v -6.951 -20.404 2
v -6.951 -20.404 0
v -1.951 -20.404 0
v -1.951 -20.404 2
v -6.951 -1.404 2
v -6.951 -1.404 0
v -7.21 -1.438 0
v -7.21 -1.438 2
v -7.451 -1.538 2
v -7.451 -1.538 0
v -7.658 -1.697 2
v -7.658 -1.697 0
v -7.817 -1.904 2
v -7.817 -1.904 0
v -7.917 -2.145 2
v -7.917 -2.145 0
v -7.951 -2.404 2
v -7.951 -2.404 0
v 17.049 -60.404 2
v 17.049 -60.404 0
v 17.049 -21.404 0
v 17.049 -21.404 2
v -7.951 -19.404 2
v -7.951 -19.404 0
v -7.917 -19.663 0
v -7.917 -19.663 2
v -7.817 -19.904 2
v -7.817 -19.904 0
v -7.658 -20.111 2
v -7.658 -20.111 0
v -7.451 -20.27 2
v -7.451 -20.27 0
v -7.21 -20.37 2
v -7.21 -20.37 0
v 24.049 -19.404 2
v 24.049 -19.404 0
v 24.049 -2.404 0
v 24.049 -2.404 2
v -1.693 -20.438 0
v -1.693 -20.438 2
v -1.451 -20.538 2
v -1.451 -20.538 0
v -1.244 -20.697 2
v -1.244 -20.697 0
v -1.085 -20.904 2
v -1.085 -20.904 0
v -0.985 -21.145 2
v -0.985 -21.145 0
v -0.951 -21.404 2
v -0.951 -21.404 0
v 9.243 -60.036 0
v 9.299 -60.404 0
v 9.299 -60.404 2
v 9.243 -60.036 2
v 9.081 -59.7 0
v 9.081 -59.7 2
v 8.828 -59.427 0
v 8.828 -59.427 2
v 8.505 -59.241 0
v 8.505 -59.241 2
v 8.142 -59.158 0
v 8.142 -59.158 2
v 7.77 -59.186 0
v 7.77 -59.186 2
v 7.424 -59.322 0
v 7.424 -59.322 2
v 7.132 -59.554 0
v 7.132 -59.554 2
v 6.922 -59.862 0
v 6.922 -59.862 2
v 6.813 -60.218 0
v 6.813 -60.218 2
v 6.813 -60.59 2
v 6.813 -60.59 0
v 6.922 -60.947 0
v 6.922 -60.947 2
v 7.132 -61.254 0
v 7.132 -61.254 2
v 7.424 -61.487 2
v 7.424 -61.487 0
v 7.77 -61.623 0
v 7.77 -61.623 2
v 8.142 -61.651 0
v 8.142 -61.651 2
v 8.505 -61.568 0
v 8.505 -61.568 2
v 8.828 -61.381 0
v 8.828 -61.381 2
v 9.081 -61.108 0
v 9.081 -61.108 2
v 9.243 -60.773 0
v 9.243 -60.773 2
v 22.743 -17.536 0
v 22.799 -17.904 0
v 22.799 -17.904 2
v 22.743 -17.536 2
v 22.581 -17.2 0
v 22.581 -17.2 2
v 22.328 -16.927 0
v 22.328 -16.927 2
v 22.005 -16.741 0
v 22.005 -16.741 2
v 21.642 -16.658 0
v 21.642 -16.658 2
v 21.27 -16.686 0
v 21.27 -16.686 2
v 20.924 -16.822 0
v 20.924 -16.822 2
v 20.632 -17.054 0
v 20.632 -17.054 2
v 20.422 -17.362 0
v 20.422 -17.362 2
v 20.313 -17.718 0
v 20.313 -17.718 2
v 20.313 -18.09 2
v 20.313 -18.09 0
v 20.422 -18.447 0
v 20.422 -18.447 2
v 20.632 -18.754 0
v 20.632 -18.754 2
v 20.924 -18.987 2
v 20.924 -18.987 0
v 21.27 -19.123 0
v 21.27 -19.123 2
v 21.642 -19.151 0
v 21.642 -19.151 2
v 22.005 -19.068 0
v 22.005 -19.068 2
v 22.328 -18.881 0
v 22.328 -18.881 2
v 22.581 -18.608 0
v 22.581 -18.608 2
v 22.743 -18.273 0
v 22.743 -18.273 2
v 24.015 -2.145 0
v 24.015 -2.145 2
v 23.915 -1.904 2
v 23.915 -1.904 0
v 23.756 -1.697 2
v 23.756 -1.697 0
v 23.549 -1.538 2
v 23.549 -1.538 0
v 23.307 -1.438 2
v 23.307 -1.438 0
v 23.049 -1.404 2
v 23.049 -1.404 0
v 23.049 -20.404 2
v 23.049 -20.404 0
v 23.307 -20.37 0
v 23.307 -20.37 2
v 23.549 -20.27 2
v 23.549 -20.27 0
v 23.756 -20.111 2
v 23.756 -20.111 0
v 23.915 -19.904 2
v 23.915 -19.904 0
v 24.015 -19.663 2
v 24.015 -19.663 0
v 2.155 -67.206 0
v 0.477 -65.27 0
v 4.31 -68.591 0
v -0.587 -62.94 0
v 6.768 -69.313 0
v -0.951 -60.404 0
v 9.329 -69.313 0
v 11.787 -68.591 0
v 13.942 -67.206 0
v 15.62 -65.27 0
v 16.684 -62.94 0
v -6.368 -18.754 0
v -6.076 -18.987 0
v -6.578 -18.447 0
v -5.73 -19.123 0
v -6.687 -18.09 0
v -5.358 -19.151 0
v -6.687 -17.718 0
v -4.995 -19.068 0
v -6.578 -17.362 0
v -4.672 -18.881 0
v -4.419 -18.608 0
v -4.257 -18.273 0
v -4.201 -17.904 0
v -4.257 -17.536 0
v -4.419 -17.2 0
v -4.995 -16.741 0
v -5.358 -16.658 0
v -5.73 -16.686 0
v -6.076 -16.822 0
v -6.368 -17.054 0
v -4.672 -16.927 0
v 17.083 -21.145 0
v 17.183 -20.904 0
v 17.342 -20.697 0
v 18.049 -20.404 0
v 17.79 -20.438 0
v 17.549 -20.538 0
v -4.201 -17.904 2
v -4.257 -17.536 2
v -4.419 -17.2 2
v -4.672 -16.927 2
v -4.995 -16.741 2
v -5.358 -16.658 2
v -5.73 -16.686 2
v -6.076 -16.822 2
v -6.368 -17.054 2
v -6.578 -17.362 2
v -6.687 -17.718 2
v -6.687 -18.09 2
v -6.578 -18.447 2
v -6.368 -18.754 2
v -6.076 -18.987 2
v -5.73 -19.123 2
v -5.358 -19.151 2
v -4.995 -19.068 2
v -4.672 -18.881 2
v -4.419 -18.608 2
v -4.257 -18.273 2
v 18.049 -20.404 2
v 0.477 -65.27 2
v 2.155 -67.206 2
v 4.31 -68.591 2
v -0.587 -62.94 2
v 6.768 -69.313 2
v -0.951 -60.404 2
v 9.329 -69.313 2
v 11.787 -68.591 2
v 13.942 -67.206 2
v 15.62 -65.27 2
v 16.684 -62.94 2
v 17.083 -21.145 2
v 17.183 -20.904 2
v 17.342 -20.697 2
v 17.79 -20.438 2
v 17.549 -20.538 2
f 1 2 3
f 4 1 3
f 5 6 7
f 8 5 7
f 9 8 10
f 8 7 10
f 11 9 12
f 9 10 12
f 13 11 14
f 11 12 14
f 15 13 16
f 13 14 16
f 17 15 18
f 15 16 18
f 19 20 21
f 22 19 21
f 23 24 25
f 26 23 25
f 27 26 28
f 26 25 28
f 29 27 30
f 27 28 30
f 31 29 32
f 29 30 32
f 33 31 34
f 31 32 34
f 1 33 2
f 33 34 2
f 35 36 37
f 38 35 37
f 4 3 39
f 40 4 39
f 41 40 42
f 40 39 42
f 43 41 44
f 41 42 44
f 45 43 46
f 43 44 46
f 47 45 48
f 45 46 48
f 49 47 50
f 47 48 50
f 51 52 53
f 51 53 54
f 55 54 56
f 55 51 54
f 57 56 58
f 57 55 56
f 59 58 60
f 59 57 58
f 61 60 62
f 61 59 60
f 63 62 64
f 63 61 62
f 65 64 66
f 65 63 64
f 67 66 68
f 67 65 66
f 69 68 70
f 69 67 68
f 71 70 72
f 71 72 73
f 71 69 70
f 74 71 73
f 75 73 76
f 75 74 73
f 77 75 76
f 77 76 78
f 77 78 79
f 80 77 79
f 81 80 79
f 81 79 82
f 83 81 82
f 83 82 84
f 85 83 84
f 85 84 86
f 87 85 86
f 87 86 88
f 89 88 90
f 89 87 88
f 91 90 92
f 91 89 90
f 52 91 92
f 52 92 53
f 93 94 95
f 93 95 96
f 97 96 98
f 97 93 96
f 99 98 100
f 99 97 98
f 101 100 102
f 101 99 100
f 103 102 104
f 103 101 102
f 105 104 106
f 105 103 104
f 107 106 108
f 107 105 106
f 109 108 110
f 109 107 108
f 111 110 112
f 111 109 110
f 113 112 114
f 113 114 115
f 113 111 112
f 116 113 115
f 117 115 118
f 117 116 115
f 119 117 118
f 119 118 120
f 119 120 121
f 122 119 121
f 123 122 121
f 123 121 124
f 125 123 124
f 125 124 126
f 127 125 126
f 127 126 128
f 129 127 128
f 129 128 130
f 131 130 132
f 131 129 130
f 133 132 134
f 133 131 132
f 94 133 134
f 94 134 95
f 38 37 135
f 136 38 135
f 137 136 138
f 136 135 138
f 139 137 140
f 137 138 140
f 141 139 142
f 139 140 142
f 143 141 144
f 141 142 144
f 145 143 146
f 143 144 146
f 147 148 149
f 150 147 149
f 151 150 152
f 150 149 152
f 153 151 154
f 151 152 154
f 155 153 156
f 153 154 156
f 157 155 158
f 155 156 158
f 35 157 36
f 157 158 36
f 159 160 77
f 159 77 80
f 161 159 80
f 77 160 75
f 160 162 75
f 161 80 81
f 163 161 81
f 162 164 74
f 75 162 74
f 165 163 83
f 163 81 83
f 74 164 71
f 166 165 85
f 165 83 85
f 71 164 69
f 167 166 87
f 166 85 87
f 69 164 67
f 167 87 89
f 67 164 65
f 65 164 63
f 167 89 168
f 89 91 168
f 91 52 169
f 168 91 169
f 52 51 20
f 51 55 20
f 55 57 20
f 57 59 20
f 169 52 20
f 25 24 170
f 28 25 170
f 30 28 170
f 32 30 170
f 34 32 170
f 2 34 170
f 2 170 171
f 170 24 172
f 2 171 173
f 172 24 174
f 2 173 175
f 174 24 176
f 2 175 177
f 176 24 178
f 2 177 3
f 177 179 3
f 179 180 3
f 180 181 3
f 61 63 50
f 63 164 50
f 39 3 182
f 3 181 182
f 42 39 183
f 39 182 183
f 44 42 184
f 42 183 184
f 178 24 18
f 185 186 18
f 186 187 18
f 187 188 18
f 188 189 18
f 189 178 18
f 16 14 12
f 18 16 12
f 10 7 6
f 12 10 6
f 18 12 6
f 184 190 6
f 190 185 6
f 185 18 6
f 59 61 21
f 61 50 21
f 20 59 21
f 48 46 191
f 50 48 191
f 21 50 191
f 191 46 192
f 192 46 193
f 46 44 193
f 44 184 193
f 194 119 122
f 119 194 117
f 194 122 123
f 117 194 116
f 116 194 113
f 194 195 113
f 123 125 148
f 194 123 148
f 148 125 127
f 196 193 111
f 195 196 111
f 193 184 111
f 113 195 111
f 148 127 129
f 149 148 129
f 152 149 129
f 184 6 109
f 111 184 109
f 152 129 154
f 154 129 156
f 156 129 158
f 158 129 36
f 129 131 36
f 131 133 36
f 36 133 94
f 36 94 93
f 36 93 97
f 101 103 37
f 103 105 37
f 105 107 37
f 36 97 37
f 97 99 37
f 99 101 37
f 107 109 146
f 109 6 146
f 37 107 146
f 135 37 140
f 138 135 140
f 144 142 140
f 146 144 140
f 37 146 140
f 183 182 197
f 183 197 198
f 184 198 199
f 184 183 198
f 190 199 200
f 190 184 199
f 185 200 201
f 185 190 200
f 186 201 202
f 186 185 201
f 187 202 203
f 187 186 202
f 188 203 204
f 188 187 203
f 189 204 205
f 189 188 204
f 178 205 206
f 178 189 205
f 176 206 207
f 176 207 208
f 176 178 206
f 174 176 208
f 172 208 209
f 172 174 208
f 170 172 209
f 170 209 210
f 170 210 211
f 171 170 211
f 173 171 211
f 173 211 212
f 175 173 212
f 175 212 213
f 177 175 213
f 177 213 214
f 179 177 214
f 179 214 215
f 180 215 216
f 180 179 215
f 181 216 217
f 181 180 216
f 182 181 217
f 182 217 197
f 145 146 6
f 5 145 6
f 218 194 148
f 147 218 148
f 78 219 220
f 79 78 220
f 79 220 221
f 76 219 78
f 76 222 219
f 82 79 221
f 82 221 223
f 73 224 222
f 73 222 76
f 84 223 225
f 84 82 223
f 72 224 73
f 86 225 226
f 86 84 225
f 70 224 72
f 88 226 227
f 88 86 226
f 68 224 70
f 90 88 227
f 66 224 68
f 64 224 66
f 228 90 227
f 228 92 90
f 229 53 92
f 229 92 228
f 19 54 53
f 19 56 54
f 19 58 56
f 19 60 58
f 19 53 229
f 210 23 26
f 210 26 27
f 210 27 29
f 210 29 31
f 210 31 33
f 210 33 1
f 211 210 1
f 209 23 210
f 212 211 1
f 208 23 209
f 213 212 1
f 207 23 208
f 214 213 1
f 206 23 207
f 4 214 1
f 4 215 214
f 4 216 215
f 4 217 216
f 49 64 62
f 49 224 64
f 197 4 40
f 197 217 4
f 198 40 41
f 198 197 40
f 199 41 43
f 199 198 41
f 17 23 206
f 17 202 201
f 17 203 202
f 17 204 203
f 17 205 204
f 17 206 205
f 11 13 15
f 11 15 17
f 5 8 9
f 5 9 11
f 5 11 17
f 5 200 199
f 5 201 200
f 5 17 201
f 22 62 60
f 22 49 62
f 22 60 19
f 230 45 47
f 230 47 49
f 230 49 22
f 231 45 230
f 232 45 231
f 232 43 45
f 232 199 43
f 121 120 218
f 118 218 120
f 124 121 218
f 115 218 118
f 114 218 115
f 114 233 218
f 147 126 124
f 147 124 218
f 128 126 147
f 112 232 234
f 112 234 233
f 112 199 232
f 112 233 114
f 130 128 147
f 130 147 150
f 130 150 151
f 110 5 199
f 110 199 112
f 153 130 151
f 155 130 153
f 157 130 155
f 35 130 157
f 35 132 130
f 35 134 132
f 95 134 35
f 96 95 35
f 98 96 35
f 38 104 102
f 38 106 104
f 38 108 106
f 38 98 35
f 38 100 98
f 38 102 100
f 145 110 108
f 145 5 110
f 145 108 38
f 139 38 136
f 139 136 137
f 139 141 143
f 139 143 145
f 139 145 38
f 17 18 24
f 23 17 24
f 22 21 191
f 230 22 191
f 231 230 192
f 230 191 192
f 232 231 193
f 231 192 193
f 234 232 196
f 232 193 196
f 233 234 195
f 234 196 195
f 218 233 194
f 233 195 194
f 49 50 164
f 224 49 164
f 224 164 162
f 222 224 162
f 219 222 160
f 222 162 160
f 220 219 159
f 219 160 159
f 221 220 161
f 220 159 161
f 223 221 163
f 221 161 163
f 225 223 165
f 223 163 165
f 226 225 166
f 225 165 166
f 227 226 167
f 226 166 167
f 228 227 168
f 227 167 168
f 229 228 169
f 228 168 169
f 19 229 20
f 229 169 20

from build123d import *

# Parameters (mm, degrees)
SKETCH_1_R      = 1.25
EXTRUDE_1_DEPTH = 2


with BuildPart() as part:
    # 草圖1 → 填料-伸長1 (new body)
    with BuildSketch(Plane.XY):
        with BuildLine():
            Line((18.048613933, -20.404186252), (23.048613933, -20.404186252))
            ThreePointArc((23.048613933, -20.404186252), (23.755720714, -20.111293033), (24.048613933, -19.404186252))
            Line((24.048613933, -19.404186252), (24.048613933, -15.404186252))
            Line((24.048613933, -15.404186252), (24.048613933, -2.404186252))
            ThreePointArc((24.048613933, -2.404186252), (23.755720714, -1.697079471), (23.048613933, -1.404186252))
            Line((23.048613933, -1.404186252), (-6.951386067, -1.404186252))
            ThreePointArc((-6.951386067, -1.404186252), (-7.658492848, -1.697079471), (-7.951386067, -2.404186252))
            Line((-7.951386067, -2.404186252), (-7.951386067, -15.404186252))
            Line((-7.951386067, -15.404186252), (-7.951386067, -19.404186252))
            ThreePointArc((-7.951386067, -19.404186252), (-7.658492848, -20.111293033), (-6.951386067, -20.404186252))
            Line((-6.951386067, -20.404186252), (-1.951386067, -20.404186252))
            ThreePointArc((-1.951386067, -20.404186252), (-1.244279286, -20.697079471), (-0.951386067, -21.404186252))
            Line((-0.951386067, -21.404186252), (-0.951386067, -60.404186252))
            ThreePointArc((-0.951386067, -60.404186252), (8.048613933, -69.404186252), (17.048613933, -60.404186252))
            Line((17.048613933, -60.404186252), (17.048613933, -21.404186252))
            ThreePointArc((17.048613933, -21.404186252), (17.341507152, -20.697079471), (18.048613933, -20.404186252))
        make_face()
        with Locations((8.048613933, -60.404186252)):
            Circle(SKETCH_1_R, mode=Mode.SUBTRACT)
        with Locations((-5.451386067, -17.904186252)):
            Circle(SKETCH_1_R, mode=Mode.SUBTRACT)
        with Locations((21.548613933, -17.904186252)):
            Circle(SKETCH_1_R, mode=Mode.SUBTRACT)
    extrude(amount=EXTRUDE_1_DEPTH)


solid = part.part
